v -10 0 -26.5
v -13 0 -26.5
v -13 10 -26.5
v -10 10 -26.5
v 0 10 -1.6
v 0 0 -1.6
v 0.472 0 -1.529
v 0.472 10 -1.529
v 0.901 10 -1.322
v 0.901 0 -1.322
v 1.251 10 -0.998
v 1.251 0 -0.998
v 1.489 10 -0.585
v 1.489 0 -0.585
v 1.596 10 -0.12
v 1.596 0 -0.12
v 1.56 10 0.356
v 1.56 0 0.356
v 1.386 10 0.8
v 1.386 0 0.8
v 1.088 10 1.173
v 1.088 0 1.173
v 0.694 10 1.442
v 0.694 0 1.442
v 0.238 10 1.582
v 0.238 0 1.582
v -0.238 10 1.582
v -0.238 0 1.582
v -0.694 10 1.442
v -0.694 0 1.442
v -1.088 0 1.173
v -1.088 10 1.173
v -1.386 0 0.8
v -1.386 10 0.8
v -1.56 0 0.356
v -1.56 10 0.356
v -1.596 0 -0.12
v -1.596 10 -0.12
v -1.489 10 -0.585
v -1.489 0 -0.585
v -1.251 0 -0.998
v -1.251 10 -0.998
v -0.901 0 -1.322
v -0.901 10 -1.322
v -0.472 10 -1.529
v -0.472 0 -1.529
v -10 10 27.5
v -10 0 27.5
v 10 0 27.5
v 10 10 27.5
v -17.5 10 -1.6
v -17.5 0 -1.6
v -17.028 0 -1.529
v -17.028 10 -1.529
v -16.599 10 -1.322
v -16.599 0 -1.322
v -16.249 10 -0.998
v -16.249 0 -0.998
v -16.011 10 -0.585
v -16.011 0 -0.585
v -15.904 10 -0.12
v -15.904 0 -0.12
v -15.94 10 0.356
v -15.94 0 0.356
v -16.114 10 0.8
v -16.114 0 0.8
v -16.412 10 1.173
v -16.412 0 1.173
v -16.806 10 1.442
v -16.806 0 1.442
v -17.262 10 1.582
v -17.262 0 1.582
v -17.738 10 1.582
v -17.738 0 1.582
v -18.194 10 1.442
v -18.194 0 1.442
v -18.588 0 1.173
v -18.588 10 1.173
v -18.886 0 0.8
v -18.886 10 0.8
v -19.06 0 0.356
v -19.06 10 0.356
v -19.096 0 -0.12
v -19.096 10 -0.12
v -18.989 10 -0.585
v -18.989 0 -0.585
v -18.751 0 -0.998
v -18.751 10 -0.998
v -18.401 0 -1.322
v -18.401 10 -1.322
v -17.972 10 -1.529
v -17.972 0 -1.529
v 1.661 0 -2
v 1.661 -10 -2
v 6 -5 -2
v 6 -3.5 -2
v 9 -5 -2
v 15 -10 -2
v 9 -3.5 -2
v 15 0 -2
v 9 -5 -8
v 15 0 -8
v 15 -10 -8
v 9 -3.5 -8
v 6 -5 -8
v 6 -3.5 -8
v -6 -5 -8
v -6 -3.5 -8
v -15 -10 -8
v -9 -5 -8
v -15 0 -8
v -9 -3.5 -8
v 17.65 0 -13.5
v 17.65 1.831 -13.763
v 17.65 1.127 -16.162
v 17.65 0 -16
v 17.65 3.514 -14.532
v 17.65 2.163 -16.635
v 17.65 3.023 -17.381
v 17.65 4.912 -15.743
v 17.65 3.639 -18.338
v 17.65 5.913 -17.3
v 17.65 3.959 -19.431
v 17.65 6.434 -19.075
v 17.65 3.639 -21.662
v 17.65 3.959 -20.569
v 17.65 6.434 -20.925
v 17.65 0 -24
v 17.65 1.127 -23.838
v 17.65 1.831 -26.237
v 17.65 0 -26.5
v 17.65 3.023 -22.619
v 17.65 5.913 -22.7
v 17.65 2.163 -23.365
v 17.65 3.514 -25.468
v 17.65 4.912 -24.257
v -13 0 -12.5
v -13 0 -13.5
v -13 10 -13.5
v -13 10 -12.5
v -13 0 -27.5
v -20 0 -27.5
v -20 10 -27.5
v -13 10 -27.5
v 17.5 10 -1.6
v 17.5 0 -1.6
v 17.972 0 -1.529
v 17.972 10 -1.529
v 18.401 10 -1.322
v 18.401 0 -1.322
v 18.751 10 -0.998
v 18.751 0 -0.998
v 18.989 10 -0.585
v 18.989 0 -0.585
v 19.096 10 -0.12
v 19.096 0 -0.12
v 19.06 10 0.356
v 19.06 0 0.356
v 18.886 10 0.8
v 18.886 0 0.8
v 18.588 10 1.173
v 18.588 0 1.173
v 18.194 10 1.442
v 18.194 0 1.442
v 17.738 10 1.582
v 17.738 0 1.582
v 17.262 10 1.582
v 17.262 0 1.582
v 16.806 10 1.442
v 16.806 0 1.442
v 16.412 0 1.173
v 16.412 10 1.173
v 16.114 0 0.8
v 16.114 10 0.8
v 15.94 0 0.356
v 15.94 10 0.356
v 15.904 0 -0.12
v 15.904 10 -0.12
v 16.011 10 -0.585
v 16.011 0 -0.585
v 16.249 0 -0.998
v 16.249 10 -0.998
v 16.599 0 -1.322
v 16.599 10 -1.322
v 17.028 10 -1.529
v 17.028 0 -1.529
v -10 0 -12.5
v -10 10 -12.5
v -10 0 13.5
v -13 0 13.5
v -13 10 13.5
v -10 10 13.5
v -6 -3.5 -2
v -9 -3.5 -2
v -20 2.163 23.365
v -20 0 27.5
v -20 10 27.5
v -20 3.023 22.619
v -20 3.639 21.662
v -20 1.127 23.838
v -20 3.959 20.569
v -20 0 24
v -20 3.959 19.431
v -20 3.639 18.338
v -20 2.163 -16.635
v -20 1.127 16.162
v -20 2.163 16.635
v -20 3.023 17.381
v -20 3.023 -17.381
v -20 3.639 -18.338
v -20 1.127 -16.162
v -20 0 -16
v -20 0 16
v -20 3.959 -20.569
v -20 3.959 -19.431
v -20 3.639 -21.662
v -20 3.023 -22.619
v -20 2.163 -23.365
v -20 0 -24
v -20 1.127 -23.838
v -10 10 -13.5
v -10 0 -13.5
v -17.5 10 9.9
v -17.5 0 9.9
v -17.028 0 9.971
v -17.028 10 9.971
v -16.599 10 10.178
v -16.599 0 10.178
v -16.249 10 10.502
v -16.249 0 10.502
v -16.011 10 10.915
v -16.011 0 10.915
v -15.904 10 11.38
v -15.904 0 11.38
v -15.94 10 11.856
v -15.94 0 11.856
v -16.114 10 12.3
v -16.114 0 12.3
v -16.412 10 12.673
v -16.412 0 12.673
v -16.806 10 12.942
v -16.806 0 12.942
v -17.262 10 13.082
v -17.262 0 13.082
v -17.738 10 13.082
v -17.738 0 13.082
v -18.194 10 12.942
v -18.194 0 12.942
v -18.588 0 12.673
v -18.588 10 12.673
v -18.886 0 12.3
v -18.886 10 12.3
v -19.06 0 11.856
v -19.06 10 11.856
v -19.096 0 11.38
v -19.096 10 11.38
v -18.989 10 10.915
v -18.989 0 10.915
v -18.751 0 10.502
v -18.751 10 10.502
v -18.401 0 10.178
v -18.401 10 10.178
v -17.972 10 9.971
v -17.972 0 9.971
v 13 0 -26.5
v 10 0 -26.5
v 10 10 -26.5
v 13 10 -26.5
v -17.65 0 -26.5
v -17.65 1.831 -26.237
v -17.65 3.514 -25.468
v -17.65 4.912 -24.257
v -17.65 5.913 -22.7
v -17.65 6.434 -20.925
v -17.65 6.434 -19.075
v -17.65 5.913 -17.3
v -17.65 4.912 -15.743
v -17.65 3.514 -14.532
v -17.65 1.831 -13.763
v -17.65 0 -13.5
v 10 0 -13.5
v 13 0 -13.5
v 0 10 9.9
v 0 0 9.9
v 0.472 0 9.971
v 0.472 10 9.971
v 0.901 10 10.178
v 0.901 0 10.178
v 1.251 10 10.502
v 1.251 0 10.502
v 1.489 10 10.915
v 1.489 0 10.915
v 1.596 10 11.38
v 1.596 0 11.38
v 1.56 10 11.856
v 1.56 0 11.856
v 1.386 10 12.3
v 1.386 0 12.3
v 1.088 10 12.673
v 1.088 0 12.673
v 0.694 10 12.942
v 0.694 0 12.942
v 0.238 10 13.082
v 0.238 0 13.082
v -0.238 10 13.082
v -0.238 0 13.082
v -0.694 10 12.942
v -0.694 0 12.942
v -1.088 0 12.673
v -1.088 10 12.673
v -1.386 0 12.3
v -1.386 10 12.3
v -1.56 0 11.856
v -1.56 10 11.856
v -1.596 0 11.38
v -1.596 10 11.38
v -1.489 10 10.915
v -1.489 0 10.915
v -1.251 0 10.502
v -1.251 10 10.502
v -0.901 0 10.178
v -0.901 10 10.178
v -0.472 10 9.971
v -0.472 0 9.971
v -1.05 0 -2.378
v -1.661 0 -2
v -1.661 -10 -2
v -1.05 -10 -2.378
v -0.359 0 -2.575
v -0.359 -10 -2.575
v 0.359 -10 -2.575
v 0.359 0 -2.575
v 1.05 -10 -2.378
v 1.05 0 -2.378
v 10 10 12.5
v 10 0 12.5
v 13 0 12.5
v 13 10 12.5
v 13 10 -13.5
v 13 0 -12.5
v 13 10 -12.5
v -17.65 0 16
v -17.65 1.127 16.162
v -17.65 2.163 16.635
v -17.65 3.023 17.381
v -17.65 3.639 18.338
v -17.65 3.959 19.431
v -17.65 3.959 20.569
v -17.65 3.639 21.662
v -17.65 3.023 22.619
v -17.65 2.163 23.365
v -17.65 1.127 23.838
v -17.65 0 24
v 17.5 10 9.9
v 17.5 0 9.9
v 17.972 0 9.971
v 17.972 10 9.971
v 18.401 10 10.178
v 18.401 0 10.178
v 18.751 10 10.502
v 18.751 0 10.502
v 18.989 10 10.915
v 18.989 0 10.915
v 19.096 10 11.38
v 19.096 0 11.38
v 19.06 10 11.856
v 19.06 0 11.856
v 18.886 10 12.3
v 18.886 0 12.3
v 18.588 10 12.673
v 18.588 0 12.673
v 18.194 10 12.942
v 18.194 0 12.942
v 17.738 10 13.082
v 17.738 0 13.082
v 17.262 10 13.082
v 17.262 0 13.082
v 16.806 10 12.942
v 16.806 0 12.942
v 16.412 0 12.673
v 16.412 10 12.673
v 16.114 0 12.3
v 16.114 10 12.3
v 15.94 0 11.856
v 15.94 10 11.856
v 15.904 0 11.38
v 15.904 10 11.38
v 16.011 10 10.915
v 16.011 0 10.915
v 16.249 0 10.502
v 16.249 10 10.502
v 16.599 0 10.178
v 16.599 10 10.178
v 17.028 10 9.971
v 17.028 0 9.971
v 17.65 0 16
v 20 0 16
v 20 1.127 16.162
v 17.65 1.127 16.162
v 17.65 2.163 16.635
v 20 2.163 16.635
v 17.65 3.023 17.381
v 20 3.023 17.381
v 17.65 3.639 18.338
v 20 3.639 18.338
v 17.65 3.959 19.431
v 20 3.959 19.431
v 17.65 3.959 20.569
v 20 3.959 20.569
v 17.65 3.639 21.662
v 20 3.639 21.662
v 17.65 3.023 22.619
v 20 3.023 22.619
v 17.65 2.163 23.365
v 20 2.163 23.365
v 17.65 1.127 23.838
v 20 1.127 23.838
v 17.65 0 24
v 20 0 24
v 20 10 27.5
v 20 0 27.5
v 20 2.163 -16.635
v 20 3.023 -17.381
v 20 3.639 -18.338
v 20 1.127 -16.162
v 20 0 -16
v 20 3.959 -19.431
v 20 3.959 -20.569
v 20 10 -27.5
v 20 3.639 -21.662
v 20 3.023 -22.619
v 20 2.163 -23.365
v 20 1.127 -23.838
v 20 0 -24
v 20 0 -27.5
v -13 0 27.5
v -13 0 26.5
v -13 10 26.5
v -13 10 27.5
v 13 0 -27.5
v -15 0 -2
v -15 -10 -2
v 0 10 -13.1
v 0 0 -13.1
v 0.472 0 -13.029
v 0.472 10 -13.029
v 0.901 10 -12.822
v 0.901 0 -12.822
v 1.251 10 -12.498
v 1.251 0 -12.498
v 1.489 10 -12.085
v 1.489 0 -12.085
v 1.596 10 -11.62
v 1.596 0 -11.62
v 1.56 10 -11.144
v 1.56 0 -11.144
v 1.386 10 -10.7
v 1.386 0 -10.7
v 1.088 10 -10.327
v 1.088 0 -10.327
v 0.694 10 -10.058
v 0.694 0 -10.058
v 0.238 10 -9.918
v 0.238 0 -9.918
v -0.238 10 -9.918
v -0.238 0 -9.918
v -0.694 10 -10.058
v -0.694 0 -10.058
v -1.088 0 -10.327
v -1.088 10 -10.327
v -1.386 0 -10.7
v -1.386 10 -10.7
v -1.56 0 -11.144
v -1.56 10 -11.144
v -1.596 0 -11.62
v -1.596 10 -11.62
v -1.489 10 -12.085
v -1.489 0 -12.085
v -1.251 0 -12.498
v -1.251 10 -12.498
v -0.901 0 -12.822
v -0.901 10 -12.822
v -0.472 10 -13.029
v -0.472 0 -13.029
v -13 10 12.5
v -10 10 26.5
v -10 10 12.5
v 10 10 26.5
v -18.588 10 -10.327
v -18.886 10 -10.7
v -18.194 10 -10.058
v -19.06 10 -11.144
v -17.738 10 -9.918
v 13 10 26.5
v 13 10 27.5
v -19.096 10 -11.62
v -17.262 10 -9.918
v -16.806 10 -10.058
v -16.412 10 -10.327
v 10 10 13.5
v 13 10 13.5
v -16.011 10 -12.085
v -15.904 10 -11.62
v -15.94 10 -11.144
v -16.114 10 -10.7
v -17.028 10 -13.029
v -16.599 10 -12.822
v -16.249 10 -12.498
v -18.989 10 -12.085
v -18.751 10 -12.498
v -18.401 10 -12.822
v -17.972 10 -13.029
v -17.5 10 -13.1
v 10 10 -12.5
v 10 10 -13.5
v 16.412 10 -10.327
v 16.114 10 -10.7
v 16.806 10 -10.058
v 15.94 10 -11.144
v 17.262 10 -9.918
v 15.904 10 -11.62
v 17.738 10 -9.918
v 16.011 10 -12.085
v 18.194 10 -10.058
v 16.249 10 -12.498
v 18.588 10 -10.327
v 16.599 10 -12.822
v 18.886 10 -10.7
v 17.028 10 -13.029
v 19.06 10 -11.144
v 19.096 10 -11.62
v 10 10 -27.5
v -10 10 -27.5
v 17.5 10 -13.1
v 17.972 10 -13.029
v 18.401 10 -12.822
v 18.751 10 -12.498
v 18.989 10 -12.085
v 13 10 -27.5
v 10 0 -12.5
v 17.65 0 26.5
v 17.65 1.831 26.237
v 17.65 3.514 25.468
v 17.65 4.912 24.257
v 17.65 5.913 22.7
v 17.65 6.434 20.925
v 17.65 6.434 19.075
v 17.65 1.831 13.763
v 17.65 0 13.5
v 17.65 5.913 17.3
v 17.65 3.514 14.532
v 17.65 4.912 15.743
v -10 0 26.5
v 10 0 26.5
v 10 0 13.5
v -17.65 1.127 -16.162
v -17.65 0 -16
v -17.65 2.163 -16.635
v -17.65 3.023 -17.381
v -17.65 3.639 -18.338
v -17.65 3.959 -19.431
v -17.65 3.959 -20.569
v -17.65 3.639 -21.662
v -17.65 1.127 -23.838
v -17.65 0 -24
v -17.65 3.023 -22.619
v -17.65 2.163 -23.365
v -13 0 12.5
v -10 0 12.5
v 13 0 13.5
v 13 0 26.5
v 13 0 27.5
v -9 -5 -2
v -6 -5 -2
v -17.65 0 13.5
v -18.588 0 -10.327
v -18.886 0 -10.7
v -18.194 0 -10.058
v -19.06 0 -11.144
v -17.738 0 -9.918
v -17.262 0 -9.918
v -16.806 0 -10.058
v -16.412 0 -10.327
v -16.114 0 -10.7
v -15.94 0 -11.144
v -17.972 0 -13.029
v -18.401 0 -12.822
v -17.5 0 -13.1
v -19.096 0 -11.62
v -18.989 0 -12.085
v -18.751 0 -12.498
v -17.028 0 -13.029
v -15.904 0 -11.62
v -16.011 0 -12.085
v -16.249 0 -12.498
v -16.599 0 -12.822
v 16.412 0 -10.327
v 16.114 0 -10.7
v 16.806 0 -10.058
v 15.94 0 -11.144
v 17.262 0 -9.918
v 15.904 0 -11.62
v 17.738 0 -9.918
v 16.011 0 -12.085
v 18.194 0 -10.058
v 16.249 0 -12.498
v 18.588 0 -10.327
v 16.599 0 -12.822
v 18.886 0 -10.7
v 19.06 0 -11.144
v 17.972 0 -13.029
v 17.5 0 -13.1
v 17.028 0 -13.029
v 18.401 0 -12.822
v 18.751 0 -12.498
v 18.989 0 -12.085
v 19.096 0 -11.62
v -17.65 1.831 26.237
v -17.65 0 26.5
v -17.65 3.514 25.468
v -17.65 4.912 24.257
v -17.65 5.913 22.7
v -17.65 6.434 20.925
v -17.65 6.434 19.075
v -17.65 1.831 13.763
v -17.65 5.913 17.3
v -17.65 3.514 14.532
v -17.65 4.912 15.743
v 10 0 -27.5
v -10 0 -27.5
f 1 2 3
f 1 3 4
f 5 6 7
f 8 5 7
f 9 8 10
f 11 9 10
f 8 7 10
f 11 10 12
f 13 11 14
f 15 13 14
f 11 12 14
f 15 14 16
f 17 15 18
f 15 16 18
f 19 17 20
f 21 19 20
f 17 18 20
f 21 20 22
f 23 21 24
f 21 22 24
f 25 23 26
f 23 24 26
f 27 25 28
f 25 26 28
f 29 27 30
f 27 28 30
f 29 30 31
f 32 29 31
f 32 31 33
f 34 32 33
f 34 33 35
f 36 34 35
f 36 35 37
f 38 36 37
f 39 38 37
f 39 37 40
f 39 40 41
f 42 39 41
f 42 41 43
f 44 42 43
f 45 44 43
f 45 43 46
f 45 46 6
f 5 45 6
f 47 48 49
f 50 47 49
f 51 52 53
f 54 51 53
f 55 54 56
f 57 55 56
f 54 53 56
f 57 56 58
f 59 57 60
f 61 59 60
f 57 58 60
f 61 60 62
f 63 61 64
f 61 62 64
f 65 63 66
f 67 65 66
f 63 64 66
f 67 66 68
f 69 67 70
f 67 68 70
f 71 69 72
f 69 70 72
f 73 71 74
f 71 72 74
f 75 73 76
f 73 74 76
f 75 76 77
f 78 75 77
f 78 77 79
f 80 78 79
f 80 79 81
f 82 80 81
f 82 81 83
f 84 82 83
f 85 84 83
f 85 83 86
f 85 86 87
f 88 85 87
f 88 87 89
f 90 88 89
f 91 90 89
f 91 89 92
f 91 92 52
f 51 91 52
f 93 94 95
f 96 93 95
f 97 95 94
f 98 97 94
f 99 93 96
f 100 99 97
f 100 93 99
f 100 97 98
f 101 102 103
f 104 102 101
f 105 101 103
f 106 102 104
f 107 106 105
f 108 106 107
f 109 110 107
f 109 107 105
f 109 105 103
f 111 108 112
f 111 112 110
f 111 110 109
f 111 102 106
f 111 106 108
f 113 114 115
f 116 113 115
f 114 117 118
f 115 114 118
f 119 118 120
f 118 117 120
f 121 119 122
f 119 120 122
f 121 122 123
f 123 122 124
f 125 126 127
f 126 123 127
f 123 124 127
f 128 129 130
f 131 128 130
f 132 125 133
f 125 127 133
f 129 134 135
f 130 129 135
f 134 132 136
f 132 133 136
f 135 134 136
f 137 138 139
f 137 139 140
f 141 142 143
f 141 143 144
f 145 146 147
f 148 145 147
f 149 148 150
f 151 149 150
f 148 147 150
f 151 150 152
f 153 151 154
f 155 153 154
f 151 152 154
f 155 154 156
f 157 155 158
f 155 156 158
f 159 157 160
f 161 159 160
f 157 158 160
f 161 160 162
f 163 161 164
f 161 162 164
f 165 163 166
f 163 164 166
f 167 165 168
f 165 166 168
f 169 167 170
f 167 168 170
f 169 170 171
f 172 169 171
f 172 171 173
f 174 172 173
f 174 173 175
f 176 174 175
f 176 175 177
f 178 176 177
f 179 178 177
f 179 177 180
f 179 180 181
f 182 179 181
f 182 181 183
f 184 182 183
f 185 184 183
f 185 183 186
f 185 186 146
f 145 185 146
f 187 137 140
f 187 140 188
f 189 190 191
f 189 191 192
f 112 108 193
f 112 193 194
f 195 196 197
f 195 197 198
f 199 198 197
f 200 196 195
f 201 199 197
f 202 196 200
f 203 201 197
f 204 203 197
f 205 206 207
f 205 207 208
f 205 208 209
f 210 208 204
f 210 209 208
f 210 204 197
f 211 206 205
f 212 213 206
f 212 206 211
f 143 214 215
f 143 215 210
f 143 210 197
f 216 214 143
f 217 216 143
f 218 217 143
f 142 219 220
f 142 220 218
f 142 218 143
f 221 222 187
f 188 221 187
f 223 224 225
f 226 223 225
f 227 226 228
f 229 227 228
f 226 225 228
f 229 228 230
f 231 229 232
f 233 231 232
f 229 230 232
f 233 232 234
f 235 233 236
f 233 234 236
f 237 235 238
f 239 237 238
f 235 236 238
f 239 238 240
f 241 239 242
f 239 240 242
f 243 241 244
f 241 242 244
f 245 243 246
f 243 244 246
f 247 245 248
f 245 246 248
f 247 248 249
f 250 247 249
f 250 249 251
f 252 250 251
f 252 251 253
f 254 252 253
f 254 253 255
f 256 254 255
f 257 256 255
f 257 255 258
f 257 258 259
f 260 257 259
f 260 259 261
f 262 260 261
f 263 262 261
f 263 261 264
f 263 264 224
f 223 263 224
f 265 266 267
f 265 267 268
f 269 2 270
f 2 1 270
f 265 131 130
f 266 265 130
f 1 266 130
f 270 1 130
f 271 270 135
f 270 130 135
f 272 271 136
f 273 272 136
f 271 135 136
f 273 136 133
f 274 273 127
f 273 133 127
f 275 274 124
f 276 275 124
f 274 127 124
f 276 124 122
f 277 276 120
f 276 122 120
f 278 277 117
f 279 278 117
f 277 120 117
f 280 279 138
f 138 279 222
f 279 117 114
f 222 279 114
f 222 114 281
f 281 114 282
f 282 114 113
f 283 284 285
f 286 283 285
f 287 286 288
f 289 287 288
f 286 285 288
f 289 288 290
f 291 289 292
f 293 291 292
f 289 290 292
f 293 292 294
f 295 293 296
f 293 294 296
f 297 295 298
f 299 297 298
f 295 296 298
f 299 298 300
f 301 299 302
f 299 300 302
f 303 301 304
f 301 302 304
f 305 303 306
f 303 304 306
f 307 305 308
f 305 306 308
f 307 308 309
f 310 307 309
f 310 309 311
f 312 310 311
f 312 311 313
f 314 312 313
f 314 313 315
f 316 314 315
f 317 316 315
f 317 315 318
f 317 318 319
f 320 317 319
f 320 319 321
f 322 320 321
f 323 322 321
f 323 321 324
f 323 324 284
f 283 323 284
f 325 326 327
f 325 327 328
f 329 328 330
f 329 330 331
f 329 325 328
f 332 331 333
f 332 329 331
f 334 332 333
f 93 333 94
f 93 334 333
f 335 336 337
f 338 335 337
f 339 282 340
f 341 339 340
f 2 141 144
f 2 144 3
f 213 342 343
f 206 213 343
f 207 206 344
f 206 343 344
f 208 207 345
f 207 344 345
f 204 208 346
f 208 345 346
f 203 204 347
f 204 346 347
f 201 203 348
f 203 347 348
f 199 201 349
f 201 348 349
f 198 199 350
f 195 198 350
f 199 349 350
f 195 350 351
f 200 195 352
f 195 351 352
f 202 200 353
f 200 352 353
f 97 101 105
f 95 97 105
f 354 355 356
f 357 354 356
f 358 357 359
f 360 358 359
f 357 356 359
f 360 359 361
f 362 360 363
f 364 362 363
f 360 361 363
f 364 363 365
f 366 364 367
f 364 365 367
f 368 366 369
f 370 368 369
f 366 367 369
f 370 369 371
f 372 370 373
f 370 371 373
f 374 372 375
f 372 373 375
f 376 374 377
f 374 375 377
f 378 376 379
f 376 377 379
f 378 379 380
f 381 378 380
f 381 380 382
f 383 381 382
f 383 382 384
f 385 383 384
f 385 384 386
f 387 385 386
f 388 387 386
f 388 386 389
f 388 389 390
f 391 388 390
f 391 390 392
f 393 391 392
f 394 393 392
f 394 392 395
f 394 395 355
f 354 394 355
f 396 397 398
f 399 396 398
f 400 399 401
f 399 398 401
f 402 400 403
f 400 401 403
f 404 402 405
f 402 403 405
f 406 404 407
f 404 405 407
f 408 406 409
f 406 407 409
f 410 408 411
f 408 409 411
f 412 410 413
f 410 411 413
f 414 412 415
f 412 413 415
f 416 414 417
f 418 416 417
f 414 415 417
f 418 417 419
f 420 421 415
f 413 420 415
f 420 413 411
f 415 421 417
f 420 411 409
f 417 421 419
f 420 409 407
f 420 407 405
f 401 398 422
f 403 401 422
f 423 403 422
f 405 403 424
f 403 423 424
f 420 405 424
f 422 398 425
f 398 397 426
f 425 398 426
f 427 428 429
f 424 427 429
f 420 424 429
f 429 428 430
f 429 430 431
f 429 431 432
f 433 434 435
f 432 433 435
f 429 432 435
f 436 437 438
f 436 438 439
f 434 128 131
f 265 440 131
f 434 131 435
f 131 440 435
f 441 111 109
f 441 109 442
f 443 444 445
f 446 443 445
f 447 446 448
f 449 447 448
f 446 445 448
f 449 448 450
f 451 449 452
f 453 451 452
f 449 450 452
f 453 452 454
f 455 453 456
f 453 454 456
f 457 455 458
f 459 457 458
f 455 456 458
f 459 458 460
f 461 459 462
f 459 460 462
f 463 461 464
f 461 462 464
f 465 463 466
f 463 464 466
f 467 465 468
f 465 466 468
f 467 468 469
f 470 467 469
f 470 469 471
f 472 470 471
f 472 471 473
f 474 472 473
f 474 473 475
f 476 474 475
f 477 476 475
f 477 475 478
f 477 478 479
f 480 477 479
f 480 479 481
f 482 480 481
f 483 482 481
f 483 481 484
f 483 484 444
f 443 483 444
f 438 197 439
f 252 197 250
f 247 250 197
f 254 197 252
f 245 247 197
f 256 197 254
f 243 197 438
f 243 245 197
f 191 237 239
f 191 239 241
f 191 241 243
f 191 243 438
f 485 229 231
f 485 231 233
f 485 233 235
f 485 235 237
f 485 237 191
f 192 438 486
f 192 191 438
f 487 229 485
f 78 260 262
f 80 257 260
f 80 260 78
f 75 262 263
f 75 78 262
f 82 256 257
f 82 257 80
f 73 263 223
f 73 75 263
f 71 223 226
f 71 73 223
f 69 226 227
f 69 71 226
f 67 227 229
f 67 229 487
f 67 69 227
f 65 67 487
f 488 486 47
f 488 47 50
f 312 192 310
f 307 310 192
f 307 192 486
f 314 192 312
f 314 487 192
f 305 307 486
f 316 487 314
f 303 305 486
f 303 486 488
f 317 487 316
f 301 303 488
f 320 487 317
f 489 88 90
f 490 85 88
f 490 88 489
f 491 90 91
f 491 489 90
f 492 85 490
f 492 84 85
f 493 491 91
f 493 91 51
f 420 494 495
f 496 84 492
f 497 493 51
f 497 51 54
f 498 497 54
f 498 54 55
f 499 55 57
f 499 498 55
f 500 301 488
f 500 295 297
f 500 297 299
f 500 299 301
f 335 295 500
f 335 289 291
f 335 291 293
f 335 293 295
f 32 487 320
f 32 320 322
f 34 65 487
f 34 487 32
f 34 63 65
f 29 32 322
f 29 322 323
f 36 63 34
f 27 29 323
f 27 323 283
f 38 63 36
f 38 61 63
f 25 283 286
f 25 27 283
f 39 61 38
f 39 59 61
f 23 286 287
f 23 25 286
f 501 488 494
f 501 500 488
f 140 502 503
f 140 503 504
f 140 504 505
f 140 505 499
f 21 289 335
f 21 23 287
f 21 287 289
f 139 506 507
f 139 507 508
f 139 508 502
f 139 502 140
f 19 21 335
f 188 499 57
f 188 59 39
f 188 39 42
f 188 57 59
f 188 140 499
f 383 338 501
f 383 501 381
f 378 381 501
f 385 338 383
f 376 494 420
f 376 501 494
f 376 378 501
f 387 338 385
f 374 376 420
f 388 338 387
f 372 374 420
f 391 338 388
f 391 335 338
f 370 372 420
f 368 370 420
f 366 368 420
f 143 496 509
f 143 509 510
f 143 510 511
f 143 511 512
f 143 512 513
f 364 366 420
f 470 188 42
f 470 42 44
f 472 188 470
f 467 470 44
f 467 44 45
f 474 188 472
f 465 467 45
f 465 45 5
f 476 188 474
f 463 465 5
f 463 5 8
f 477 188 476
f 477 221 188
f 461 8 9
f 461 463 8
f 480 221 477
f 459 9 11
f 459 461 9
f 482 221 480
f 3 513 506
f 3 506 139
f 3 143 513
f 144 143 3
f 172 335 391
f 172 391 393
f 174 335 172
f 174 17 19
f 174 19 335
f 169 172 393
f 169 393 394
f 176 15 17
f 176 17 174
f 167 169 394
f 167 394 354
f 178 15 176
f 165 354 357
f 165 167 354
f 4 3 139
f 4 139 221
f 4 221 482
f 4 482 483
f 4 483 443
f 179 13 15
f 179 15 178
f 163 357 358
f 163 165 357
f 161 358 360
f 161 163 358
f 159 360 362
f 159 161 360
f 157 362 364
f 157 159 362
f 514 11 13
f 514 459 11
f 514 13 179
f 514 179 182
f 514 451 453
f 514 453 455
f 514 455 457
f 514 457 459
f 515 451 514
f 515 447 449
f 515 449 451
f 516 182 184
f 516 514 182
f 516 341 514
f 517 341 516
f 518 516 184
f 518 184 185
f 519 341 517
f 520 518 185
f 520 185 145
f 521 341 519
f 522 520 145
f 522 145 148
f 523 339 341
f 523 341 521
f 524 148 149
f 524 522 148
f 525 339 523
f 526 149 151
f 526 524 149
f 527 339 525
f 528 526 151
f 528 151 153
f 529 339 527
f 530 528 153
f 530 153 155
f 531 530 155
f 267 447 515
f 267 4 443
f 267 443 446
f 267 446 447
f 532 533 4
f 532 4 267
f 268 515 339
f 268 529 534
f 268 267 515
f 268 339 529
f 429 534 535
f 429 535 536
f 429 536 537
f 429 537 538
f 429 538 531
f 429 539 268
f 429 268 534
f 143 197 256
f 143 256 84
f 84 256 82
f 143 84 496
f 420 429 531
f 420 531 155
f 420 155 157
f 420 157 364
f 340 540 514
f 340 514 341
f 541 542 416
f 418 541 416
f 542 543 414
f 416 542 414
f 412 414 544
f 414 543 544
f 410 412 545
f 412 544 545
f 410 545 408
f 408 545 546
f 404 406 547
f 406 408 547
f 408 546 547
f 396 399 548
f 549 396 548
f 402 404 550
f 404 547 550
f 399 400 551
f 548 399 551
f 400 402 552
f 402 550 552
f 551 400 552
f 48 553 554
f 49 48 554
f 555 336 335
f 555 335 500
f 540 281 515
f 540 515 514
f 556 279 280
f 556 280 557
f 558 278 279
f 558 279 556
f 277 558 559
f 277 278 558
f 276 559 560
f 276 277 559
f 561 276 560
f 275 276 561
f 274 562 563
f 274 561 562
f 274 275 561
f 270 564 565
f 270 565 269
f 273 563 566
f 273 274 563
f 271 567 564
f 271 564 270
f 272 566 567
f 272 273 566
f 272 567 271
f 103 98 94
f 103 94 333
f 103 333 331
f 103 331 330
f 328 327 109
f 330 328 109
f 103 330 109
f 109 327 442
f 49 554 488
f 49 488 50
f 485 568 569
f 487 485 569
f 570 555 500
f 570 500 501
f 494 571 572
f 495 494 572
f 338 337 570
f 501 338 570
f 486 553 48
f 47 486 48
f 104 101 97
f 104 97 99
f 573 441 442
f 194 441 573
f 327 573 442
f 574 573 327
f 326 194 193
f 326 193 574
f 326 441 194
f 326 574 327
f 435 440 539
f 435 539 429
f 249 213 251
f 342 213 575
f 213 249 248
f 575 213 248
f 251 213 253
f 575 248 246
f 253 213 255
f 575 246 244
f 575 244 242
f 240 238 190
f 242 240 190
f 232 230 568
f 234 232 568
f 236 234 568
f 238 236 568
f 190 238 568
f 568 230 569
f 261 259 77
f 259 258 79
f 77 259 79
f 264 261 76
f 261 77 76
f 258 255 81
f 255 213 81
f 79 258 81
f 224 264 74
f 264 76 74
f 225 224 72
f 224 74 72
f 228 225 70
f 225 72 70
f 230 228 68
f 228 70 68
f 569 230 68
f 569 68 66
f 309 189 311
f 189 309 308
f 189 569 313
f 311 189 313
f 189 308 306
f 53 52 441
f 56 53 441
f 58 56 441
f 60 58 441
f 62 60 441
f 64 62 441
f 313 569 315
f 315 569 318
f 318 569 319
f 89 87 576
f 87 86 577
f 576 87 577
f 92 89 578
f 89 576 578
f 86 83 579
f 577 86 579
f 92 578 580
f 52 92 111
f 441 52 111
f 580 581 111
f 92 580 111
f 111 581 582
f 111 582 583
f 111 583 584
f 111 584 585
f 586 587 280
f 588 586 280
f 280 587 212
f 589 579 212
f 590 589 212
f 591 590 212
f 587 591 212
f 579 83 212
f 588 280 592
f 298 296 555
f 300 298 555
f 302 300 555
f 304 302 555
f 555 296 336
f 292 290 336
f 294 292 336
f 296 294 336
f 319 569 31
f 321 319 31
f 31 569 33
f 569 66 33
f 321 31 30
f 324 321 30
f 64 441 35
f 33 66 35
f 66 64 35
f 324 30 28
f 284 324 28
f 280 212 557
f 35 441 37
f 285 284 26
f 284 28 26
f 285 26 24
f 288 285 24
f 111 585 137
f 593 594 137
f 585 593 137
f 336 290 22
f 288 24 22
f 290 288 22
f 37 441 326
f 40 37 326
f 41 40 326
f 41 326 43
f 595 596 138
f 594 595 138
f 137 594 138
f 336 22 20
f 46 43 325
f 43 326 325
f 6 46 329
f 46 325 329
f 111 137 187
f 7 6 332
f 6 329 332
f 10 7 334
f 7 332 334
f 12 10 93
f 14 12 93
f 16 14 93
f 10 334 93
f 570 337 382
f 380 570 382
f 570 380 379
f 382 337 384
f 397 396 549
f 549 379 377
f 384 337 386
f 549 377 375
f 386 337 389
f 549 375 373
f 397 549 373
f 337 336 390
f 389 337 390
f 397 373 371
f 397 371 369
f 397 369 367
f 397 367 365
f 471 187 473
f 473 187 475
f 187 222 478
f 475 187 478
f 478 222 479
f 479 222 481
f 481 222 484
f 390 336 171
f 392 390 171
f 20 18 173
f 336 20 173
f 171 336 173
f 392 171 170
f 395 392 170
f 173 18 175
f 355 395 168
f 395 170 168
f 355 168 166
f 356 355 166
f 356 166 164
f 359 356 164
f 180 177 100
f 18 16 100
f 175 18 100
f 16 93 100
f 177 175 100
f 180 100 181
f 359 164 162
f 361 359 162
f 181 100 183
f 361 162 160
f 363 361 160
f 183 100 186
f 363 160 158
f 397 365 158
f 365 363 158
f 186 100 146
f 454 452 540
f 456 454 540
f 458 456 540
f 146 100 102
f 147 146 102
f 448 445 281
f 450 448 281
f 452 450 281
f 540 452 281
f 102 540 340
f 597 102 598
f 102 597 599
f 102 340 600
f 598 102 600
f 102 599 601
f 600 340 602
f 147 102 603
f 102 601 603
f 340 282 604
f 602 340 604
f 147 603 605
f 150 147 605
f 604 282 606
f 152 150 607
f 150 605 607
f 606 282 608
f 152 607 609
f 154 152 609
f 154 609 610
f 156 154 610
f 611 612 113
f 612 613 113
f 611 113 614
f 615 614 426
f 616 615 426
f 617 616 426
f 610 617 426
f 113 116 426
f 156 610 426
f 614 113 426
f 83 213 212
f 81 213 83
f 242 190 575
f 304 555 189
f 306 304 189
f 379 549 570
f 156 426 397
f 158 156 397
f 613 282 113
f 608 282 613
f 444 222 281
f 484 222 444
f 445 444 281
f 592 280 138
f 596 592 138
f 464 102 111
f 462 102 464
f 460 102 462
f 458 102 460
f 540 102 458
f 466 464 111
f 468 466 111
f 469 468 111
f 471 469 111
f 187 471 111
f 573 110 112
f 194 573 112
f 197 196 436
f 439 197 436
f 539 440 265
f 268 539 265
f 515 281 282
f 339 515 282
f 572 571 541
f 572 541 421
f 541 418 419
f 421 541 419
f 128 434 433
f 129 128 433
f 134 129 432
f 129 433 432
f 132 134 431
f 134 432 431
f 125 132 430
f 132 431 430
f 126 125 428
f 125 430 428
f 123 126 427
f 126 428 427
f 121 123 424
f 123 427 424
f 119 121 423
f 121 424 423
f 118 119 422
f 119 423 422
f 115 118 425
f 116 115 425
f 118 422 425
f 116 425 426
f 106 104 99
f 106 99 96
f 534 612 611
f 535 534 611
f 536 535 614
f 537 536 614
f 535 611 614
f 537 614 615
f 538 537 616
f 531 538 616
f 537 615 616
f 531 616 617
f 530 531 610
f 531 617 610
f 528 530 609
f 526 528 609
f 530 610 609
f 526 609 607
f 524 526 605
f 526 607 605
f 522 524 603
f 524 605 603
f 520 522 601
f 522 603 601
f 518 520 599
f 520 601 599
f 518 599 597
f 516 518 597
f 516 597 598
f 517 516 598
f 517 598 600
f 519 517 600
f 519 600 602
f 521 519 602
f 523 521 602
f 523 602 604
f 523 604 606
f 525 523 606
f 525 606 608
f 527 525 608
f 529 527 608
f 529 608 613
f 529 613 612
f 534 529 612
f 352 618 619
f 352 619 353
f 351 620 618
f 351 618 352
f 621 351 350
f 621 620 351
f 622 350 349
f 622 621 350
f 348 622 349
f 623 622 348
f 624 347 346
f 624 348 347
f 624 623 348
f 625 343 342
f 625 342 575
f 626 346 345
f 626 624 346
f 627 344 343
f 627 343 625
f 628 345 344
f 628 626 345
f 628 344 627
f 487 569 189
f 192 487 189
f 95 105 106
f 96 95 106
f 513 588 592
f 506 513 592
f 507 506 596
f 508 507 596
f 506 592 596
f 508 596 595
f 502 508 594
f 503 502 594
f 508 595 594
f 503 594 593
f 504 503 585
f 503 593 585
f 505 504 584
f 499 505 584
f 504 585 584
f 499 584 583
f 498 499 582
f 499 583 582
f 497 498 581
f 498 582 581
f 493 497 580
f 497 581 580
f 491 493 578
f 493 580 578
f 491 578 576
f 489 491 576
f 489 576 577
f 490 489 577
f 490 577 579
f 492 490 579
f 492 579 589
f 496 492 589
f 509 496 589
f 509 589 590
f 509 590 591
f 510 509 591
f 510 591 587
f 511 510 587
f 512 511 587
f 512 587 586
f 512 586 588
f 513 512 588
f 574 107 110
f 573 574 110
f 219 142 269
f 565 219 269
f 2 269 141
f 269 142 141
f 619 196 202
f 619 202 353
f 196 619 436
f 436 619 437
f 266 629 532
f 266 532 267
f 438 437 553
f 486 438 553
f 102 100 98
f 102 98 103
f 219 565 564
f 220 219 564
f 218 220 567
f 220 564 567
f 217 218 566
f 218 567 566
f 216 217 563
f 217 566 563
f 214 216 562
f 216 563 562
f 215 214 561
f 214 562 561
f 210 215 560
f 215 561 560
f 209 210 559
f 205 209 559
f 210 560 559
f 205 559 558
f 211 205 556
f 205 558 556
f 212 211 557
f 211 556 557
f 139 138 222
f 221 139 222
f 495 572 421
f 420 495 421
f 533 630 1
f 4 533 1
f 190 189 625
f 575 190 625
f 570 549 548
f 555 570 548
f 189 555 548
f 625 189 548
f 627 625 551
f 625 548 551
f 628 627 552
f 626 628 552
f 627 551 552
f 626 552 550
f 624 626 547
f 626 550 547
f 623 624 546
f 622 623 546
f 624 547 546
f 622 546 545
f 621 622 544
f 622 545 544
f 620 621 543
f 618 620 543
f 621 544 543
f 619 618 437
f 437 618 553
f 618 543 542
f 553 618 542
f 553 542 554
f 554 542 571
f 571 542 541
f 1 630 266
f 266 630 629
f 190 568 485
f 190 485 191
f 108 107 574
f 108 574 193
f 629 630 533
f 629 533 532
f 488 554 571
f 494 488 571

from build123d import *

# Parameters (mm, degrees)
SKETCH_1_W          = 40000
SKETCH_1_H          = 55000
EXTRUDE_1_DEPTH     = 10000
SKETCH_2_R          = 6500
CUT_EXTRUDE_1_DEPTH = 17650
SKETCH_3_W          = 3000
SKETCH_3_H          = 1000
CUT_EXTRUDE_2_DEPTH = 35300
SKETCH_5_R          = 1600
CUT_EXTRUDE_4_DEPTH = 35300
SKETCH_7_R          = 4000
CUT_EXTRUDE_5_DEPTH = 100000
SCALE_1_SCALE       = 0.001
EXTRUDE_3_DEPTH     = 10
SKETCH_10_W         = 3
SKETCH_10_H         = 1.5
CUT_EXTRUDE_6_DEPTH = 10


with BuildPart() as part:
    # 草圖1 → 填料-伸長1 (new body)
    with BuildSketch(Plane(origin=(0, 0, 0), x_dir=(1, 0, 0), z_dir=(0, 1, 0))):
        Rectangle(SKETCH_1_W, SKETCH_1_H)
    extrude(amount=EXTRUDE_1_DEPTH)

    # 草圖2 → 除料-伸長1 (cut, symmetric)
    with BuildSketch(Plane(origin=(0, 0, 0), x_dir=(0, 0, -1), z_dir=(1, 0, 0))):
        with Locations((-20000, 0)):
            Circle(SKETCH_2_R)
        with Locations((20000, 0)):
            Circle(SKETCH_2_R)
    extrude(amount=CUT_EXTRUDE_1_DEPTH, both=True, mode=Mode.SUBTRACT)

    # 草圖3 → 除料-伸長2 (cut)
    with BuildSketch(Plane.XZ):
        with Locations((-11500, 27000)):
            Rectangle(SKETCH_3_W, SKETCH_3_H)
        with Locations((11500, 27000)):
            Rectangle(SKETCH_3_W, SKETCH_3_H)
        with Locations((11500, 13000)):
            Rectangle(SKETCH_3_W, SKETCH_3_H)
        with Locations((-11500, 13000)):
            Rectangle(SKETCH_3_W, SKETCH_3_H)
        with Locations((-11500, -13000)):
            Rectangle(SKETCH_3_W, SKETCH_3_H)
        with Locations((11500, -13000)):
            Rectangle(SKETCH_3_W, SKETCH_3_H)
        with Locations((11500, -27000)):
            Rectangle(SKETCH_3_W, SKETCH_3_H)
        with Locations((-11500, -27000)):
            Rectangle(SKETCH_3_W, SKETCH_3_H)
    extrude(amount=-CUT_EXTRUDE_2_DEPTH, mode=Mode.SUBTRACT)

    # 草圖5 → 除料-伸長4 (cut)
    with BuildSketch(Plane.XZ):
        with Locations(Location((-17500, 11500, 0), (0, 0, 270))):
            Circle(SKETCH_5_R)
        with Locations(Location((17500, 11500, 0), (0, 0, 270))):
            Circle(SKETCH_5_R)
        with Locations(Location((17500, -11500, 0), (0, 0, 270))):
            Circle(SKETCH_5_R)
        with Locations(Location((-17500, -11500, 0), (0, 0, 270))):
            Circle(SKETCH_5_R)
        with Locations(Location((0, 11500, 0), (0, 0, 270))):
            Circle(SKETCH_5_R)
        with Locations(Location((0, 0, 0), (0, 0, 270))):
            Circle(SKETCH_5_R)
        with Locations(Location((0, -11500, 0), (0, 0, 270))):
            Circle(SKETCH_5_R)
        with Locations(Location((-17500, 0, 0), (0, 0, 270))):
            Circle(SKETCH_5_R)
        with Locations(Location((17500, 0, 0), (0, 0, 270))):
            Circle(SKETCH_5_R)
    extrude(amount=-CUT_EXTRUDE_4_DEPTH, mode=Mode.SUBTRACT)

    # 草圖7 → 除料-伸長5 (cut)
    with BuildSketch(Plane(origin=(20000, 0, 0), x_dir=(0, 0, -1), z_dir=(1, 0, 0))):
        with Locations((20000, 0)):
            Circle(SKETCH_7_R)
        with Locations((-20000, 0)):
            Circle(SKETCH_7_R)
    extrude(amount=-CUT_EXTRUDE_5_DEPTH, mode=Mode.SUBTRACT)


with BuildPart() as part_1:
    # 縮放比例1: scaled about (0, 0, 0)
    add(part.part.scale(SCALE_1_SCALE))

    # 草圖9 → 填料-伸長3 (add)
    with BuildSketch(Plane.XZ):
        with BuildLine():
            Line((-15, -2), (-1.661324773, -2))
            ThreePointArc((-1.661324773, -2), (0, -2.6), (1.661324773, -2))
            Line((1.661324773, -2), (15, -2))
            Line((15, -2), (15, -8))
            Line((15, -8), (-15, -8))
            Line((-15, -8), (-15, -2))
        make_face()
    extrude(amount=EXTRUDE_3_DEPTH)

    # 草圖10 → 除料-伸長6 (cut)
    with BuildSketch(Plane(origin=(0, 0, -8), x_dir=(-1, 0, 0), z_dir=(0, 0, -1))):
        with Locations((-7.5, -4.25)):
            Rectangle(SKETCH_10_W, SKETCH_10_H)
        with Locations((7.5, -4.25)):
            Rectangle(SKETCH_10_W, SKETCH_10_H)
    extrude(amount=-CUT_EXTRUDE_6_DEPTH, mode=Mode.SUBTRACT)


solid = part_1.part
